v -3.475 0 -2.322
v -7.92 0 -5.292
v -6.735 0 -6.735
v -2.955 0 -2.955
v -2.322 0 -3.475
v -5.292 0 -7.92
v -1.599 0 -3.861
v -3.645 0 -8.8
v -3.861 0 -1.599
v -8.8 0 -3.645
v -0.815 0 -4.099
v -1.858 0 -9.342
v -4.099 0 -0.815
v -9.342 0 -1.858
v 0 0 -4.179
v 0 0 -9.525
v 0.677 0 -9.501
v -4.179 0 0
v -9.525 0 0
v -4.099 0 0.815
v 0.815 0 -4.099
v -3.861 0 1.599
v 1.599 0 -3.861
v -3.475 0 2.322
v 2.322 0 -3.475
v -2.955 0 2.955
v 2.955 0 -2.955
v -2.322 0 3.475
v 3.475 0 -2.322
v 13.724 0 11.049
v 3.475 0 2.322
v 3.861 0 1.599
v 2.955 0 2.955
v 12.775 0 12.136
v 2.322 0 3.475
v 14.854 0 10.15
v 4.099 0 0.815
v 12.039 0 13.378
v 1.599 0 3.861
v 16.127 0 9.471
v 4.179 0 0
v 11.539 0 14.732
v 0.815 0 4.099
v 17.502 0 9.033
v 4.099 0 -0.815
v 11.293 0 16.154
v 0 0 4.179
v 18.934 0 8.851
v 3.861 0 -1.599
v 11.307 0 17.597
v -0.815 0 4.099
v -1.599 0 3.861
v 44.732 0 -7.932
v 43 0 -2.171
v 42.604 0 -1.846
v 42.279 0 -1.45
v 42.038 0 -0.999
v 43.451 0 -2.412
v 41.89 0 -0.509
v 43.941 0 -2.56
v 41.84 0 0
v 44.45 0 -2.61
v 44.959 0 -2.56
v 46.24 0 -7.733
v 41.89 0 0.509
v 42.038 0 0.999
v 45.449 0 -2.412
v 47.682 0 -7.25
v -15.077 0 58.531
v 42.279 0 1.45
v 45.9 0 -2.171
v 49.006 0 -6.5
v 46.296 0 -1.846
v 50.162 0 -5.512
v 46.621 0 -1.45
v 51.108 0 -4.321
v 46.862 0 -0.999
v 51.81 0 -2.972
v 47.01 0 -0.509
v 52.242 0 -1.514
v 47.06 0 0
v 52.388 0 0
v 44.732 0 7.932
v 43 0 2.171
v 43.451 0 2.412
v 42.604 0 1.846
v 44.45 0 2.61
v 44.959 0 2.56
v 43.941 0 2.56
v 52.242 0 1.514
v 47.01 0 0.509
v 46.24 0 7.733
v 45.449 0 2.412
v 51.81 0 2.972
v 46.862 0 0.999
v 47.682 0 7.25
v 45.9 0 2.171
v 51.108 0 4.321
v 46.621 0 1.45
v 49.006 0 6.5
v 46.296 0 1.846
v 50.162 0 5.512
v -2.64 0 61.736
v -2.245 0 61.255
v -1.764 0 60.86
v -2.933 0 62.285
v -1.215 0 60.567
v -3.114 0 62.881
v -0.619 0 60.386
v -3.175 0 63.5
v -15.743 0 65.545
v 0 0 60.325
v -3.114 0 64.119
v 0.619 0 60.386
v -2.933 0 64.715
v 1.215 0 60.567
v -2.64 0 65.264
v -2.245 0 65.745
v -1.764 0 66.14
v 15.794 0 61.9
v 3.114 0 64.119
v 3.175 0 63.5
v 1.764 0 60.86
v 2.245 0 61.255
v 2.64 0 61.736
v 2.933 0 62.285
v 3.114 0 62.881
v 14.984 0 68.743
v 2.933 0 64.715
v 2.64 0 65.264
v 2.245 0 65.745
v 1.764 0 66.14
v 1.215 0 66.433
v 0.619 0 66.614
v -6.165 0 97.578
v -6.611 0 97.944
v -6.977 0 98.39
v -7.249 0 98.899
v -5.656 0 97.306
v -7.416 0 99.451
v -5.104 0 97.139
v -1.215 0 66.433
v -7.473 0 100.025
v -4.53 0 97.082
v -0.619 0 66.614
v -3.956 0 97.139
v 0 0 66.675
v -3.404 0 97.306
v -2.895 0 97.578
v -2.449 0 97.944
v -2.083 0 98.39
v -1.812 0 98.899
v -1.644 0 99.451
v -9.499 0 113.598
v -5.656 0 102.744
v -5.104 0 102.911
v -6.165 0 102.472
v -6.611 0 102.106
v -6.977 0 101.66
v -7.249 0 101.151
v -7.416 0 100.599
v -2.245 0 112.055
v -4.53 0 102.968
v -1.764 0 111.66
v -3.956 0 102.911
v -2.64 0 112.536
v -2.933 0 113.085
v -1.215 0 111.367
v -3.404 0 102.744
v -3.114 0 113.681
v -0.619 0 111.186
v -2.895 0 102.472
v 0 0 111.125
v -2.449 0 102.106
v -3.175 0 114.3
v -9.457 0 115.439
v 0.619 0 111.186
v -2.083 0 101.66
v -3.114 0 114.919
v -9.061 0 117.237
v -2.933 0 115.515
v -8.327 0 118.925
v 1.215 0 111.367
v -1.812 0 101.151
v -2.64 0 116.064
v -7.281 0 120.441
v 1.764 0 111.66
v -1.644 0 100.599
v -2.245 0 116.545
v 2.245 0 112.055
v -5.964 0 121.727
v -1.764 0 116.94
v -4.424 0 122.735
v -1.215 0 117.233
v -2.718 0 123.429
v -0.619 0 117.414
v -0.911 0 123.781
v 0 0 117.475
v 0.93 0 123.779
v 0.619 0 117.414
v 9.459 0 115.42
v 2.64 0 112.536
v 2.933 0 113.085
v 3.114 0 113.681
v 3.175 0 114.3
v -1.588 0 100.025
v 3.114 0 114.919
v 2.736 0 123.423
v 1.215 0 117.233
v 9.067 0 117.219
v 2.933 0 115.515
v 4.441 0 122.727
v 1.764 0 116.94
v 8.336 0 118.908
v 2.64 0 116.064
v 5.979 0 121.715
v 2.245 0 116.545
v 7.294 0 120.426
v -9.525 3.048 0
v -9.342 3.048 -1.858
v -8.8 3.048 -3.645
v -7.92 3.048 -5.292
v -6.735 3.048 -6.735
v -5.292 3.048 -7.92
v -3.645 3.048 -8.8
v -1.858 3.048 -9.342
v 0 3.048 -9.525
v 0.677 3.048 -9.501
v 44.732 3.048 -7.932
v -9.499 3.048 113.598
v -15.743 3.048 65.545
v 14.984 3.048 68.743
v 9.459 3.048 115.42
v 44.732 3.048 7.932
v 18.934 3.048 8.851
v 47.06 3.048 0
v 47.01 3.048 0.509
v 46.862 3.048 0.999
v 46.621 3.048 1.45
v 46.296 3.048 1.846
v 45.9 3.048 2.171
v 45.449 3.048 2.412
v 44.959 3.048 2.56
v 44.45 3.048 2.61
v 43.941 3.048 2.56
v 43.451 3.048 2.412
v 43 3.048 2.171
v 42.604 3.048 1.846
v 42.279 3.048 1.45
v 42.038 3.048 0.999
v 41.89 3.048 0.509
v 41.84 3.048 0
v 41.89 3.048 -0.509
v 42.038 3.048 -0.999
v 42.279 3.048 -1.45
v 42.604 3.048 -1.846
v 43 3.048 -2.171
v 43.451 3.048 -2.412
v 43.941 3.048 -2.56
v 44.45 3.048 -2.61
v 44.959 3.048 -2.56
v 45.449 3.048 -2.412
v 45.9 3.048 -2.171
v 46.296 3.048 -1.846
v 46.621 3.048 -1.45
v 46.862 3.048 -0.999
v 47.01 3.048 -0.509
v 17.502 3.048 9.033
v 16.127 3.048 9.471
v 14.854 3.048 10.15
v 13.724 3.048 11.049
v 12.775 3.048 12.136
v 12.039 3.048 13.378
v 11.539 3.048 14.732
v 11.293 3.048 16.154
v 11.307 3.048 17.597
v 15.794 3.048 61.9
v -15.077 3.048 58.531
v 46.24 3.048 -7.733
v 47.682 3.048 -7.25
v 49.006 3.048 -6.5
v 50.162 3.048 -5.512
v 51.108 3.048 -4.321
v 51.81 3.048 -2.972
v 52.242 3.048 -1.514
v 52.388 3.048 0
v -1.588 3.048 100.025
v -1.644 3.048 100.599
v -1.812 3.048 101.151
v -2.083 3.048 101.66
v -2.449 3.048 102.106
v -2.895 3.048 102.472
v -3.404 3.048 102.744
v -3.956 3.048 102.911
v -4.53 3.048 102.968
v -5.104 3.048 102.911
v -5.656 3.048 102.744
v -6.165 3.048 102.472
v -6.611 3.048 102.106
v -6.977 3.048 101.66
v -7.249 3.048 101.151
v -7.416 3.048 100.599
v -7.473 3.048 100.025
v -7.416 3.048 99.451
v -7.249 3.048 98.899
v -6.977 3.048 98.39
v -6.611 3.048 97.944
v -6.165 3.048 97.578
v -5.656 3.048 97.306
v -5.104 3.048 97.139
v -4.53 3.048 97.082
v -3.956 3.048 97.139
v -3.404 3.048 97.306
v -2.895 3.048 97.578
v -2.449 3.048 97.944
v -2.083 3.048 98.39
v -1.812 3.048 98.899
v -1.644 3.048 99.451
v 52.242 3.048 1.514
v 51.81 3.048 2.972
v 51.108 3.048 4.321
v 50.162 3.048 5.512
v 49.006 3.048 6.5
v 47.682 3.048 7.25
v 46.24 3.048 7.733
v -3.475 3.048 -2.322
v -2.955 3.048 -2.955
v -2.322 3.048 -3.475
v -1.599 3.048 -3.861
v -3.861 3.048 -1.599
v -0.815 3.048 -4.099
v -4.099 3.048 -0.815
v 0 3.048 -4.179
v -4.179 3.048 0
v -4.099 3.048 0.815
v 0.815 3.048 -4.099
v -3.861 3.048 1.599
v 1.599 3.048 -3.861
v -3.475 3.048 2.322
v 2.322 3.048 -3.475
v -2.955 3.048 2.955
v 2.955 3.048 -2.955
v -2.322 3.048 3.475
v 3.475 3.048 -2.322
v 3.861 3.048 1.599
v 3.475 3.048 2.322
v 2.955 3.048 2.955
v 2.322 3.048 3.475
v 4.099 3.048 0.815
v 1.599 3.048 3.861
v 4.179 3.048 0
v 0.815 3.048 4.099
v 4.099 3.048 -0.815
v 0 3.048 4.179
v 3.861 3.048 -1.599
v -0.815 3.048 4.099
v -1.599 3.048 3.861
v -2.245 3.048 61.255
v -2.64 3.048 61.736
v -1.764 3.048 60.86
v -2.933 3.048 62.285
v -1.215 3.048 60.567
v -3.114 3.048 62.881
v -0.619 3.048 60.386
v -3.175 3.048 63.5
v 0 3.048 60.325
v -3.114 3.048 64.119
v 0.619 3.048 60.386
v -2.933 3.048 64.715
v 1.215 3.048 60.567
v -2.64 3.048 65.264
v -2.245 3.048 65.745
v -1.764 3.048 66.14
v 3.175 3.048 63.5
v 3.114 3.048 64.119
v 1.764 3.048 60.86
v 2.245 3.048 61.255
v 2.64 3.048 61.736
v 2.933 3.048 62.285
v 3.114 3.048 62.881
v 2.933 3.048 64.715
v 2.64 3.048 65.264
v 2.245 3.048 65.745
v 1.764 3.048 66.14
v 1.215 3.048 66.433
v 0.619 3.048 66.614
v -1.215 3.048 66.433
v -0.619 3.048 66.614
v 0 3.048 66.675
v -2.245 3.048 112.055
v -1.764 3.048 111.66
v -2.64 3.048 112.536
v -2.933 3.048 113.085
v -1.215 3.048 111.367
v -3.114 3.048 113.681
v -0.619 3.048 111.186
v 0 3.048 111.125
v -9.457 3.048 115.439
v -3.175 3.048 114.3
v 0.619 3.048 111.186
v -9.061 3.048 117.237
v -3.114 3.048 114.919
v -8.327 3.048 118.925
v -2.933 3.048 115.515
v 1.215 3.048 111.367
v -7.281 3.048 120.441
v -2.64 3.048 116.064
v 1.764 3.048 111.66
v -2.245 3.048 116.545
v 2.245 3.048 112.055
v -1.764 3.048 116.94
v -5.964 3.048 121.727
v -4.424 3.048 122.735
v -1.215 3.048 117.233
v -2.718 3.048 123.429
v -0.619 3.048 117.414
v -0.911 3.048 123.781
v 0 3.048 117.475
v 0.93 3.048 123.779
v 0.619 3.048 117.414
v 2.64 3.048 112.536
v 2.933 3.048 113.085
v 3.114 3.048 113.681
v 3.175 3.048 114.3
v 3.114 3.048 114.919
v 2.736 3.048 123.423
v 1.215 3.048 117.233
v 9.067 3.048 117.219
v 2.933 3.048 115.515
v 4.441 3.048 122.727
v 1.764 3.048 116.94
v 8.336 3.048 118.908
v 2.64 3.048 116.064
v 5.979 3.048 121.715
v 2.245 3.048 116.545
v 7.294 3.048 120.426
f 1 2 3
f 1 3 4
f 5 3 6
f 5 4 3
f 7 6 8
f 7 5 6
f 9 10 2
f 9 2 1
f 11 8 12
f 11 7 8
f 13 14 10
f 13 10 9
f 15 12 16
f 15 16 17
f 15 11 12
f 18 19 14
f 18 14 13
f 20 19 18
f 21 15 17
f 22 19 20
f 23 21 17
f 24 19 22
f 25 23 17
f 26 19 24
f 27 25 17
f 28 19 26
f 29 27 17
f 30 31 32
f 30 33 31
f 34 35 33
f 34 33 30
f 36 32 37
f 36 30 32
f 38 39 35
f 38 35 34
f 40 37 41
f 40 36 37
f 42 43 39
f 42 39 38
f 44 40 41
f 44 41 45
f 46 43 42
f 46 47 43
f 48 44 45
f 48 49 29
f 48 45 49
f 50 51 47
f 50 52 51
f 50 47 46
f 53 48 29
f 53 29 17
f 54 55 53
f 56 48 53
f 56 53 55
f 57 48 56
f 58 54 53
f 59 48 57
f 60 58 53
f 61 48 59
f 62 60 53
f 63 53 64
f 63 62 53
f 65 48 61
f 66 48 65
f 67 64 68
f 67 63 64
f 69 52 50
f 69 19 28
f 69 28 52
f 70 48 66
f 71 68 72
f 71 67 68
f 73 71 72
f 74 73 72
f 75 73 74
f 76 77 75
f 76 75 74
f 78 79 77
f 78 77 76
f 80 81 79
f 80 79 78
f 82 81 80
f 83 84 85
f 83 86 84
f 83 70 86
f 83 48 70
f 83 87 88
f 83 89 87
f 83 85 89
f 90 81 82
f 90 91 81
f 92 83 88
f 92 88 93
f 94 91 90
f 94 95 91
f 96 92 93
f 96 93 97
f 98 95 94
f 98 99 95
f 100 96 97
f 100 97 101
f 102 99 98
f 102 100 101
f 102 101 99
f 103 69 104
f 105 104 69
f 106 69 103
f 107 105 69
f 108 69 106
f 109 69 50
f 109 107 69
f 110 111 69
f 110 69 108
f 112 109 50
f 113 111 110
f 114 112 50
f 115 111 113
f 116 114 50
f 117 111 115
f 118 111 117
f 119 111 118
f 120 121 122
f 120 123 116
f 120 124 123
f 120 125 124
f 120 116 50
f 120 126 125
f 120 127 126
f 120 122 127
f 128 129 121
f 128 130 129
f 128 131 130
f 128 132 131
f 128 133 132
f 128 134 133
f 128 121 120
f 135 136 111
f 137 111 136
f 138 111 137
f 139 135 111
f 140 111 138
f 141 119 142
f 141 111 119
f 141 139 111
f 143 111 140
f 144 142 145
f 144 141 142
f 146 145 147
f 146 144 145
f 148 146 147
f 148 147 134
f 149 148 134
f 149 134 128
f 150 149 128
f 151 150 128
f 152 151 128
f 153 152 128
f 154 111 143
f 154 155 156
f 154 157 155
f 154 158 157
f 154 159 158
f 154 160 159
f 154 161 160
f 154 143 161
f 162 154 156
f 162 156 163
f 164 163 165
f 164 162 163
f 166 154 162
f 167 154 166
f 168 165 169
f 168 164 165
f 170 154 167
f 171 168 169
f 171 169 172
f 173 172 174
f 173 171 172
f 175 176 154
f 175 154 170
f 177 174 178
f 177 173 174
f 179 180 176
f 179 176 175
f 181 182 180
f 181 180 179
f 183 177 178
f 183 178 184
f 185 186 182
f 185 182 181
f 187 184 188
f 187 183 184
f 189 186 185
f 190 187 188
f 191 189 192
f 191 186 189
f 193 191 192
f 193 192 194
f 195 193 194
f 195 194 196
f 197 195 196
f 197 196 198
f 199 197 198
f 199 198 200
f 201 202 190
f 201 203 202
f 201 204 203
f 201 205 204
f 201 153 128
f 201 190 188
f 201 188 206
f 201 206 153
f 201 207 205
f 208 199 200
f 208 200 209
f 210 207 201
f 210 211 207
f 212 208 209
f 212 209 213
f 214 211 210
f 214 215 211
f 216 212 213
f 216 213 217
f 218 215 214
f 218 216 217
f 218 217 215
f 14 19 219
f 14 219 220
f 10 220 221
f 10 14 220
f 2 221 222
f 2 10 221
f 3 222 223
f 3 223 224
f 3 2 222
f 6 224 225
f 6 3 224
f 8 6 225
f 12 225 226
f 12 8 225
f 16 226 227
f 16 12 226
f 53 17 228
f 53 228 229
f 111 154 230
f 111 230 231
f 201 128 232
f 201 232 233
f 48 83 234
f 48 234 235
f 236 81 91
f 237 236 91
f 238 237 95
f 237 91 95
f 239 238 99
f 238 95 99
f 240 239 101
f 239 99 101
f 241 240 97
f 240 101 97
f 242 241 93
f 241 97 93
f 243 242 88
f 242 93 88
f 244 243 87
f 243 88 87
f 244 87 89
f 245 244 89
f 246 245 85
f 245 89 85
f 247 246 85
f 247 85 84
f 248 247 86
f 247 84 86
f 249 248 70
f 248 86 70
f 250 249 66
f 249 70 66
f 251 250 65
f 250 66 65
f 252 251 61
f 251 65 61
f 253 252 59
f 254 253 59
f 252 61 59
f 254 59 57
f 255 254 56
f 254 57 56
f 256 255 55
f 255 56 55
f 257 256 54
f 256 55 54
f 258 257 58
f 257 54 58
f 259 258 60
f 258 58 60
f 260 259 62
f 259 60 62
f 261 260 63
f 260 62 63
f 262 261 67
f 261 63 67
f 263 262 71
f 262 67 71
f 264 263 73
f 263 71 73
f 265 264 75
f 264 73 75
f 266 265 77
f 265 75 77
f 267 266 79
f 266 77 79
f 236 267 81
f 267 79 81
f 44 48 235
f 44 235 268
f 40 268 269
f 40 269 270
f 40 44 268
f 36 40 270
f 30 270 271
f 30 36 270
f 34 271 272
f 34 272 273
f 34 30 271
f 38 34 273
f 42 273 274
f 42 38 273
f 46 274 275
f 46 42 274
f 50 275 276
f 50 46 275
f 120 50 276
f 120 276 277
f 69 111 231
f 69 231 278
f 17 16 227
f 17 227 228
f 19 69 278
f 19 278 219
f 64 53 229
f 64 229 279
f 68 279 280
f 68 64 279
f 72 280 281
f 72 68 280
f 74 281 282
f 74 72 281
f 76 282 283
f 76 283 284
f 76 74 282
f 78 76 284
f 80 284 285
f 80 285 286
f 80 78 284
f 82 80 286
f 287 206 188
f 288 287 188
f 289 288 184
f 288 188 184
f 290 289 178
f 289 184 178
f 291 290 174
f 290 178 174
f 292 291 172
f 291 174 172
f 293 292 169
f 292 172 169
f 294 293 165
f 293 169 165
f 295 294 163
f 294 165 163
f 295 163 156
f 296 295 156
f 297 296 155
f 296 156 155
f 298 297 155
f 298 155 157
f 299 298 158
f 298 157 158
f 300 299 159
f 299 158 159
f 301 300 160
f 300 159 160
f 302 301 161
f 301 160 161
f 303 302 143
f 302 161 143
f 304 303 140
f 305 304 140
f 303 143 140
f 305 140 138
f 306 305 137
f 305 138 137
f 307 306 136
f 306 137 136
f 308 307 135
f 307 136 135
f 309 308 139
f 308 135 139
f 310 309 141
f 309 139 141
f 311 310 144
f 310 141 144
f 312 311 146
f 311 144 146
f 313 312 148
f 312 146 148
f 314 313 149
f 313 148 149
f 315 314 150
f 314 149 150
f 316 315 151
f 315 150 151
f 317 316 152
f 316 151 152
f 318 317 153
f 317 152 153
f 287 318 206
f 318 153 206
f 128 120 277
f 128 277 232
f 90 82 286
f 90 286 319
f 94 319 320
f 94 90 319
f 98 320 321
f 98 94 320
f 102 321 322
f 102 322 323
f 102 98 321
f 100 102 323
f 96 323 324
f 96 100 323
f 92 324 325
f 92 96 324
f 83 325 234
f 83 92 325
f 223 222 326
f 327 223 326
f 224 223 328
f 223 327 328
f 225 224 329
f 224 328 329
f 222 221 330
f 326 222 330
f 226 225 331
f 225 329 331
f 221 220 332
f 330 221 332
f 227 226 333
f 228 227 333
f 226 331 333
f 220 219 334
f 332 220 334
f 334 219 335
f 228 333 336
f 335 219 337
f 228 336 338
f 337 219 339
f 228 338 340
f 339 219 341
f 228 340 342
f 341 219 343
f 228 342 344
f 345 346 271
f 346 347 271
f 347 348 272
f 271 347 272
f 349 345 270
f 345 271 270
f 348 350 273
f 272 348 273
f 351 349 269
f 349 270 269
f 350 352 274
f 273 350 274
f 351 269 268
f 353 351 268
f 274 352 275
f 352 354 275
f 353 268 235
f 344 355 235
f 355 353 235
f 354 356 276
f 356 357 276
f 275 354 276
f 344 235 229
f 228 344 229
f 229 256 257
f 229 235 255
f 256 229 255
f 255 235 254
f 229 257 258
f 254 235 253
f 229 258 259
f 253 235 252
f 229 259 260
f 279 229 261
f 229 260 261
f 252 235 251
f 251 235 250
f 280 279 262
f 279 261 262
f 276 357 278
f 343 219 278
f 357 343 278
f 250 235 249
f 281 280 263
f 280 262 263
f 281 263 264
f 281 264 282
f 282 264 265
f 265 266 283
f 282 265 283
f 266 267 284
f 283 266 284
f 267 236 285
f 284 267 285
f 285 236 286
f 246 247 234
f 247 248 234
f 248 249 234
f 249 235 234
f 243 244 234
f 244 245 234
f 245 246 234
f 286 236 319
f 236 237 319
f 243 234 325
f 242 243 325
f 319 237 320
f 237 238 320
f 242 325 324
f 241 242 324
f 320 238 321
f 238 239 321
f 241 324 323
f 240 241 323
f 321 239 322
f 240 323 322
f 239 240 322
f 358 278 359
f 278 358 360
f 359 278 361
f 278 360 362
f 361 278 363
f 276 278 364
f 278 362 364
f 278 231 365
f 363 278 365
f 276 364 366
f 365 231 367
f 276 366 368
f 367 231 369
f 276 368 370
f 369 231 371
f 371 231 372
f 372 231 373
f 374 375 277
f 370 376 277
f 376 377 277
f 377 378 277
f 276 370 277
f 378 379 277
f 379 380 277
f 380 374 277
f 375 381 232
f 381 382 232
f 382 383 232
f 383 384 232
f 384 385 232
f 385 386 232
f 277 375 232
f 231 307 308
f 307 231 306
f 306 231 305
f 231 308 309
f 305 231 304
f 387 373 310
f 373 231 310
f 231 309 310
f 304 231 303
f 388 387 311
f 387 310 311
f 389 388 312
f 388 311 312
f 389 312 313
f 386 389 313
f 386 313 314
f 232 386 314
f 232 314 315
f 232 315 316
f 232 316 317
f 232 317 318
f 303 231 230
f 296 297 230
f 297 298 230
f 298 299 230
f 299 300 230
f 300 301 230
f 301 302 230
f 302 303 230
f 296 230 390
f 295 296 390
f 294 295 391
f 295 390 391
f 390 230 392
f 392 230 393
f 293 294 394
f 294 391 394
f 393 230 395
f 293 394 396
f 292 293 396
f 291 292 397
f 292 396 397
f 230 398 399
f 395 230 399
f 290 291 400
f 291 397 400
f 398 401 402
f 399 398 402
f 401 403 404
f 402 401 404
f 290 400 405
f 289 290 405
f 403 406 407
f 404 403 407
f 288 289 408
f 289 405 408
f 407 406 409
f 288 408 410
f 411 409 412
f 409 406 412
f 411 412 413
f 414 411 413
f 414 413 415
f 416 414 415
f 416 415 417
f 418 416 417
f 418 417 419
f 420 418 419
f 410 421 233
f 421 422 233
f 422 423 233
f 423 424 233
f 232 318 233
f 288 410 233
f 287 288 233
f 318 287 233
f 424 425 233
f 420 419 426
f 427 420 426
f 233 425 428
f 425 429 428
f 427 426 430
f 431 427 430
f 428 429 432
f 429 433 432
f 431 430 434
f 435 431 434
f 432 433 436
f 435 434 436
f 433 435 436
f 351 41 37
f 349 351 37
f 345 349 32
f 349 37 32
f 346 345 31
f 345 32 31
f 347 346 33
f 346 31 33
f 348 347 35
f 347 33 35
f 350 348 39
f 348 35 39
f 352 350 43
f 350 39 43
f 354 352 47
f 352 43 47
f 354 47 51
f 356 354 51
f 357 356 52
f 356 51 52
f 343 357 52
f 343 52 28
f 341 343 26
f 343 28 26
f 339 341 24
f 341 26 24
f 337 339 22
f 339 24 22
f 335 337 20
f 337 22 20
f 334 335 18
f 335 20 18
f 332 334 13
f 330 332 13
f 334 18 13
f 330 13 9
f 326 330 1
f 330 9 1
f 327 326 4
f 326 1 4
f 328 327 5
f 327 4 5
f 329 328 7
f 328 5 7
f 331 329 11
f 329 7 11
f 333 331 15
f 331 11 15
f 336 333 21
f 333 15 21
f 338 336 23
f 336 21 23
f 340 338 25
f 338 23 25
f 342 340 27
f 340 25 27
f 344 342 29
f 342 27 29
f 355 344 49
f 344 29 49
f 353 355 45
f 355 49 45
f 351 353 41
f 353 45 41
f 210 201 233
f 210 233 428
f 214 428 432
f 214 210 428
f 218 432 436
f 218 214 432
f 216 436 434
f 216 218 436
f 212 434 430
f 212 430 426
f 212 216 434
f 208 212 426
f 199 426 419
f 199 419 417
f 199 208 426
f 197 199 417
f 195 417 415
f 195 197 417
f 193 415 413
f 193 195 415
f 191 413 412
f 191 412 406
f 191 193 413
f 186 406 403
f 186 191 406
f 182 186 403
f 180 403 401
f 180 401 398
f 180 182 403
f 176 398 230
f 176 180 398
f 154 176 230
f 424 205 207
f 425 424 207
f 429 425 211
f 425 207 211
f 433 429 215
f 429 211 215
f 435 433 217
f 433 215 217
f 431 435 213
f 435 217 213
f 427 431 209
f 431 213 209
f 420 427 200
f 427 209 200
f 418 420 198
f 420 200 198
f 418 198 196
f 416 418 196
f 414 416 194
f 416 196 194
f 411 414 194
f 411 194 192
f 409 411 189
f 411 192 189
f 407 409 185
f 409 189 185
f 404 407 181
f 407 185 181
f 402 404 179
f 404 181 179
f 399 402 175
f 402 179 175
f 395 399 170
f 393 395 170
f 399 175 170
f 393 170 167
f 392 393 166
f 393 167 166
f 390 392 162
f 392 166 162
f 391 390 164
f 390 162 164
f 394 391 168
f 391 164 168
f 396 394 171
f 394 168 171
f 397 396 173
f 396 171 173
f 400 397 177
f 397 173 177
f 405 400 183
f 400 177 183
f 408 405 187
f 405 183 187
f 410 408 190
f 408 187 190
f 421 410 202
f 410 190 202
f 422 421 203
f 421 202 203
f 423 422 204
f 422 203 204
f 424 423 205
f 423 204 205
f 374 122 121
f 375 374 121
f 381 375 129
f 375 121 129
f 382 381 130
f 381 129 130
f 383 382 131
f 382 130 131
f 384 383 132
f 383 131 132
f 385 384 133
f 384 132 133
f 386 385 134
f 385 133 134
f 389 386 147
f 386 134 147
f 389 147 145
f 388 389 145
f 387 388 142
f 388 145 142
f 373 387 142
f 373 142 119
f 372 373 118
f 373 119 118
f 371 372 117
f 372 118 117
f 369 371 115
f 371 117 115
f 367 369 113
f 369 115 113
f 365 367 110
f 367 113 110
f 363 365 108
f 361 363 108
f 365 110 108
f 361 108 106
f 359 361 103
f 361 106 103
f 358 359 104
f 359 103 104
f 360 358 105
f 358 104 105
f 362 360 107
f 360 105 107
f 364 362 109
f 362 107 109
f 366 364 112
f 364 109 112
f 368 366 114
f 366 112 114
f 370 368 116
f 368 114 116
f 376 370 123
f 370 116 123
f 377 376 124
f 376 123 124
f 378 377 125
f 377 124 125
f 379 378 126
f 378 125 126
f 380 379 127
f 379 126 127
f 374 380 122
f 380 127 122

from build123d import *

# Parameters (mm, degrees)
F0_R     = 2.942768
F0_R_2   = 3.175
F0_R_3   = 2.610476
F0_R_4   = 4.179488
F1_DEPTH = 3.048


with BuildPart() as f1:
    # F0 (on Front) → F1 (new body)
    with BuildSketch(Plane.XZ):
        with BuildLine():
            ThreePointArc((9.45896, 115.419686), (9.508476, 114.860816), (9.525, 114.3))
            ThreePointArc((9.525, 114.3), (0.351146, 104.781475), (-9.49911, 113.598185))
            Line((-9.49911, 113.598185), (-15.742671, 65.545469))
            ThreePointArc((-15.742671, 65.545469), (-1.643104, 79.289738), (14.984226, 68.742956))
            Line((14.984226, 68.742956), (9.45896, 115.419686))
        make_face()
        with Locations((-4.530268, 100.0252)):
            Circle(F0_R, mode=Mode.SUBTRACT)
        with BuildLine():
            Line((15.794203, 61.90038), (14.984226, 68.742956))
            ThreePointArc((14.984226, 68.742956), (-1.643104, 79.289738), (-15.742671, 65.545469))
            Line((-15.742671, 65.545469), (-15.077269, 58.530939))
            ThreePointArc((-15.077269, 58.530939), (1.722435, 47.718719), (15.794203, 61.90038))
        make_face()
        with Locations((0, 63.5)):
            Circle(F0_R_2, mode=Mode.SUBTRACT)
        with BuildLine():
            Line((11.307223, 17.59718), (15.794203, 61.90038))
            ThreePointArc((15.794203, 61.90038), (1.722435, 47.718719), (-15.077269, 58.530939))
            Line((-15.077269, 58.530939), (-9.525, 0))
            ThreePointArc((-9.525, 0), (0, 9.525), (9.525, 0))
            ThreePointArc((9.525, 0), (6.970557, -6.491299), (0.677344, -9.500886))
            Line((0.677344, -9.500886), (44.732405, -7.932475))
            ThreePointArc((44.732405, -7.932475), (36.5125, 0), (44.732405, 7.932475))
            Line((44.732405, 7.932475), (18.934103, 8.850924))
            ThreePointArc((18.934103, 8.850924), (13.224974, 11.57098), (11.307223, 17.59718))
        make_face()
        with BuildLine():
            ThreePointArc((52.3875, 0), (50.161633, 5.51191), (44.732405, 7.932475))
            ThreePointArc((44.732405, 7.932475), (36.5125, 0), (44.732405, -7.932475))
            ThreePointArc((44.732405, -7.932475), (50.161633, -5.51191), (52.3875, 0))
        make_face()
        with Locations((44.45, 0)):
            Circle(F0_R_3, mode=Mode.SUBTRACT)
        with BuildLine():
            ThreePointArc((9.525, 0), (0, 9.525), (-9.525, 0))
            ThreePointArc((-9.525, 0), (-6.735192, -6.735192), (0, -9.525))
            Line((0, -9.525), (0.677344, -9.500886))
            ThreePointArc((0.677344, -9.500886), (6.970557, -6.491299), (9.525, 0))
        make_face()
        Circle(F0_R_4, mode=Mode.SUBTRACT)
        with BuildLine():
            ThreePointArc((-9.49911, 113.598185), (0.351146, 104.781475), (9.525, 114.3))
            ThreePointArc((9.525, 114.3), (9.508476, 114.860816), (9.45896, 115.419686))
            ThreePointArc((9.45896, 115.419686), (-0.910971, 123.781337), (-9.49911, 113.598185))
        make_face()
        with Locations((0, 114.3)):
            Circle(F0_R_2, mode=Mode.SUBTRACT)
    extrude(amount=-F1_DEPTH)


solid = f1.part
